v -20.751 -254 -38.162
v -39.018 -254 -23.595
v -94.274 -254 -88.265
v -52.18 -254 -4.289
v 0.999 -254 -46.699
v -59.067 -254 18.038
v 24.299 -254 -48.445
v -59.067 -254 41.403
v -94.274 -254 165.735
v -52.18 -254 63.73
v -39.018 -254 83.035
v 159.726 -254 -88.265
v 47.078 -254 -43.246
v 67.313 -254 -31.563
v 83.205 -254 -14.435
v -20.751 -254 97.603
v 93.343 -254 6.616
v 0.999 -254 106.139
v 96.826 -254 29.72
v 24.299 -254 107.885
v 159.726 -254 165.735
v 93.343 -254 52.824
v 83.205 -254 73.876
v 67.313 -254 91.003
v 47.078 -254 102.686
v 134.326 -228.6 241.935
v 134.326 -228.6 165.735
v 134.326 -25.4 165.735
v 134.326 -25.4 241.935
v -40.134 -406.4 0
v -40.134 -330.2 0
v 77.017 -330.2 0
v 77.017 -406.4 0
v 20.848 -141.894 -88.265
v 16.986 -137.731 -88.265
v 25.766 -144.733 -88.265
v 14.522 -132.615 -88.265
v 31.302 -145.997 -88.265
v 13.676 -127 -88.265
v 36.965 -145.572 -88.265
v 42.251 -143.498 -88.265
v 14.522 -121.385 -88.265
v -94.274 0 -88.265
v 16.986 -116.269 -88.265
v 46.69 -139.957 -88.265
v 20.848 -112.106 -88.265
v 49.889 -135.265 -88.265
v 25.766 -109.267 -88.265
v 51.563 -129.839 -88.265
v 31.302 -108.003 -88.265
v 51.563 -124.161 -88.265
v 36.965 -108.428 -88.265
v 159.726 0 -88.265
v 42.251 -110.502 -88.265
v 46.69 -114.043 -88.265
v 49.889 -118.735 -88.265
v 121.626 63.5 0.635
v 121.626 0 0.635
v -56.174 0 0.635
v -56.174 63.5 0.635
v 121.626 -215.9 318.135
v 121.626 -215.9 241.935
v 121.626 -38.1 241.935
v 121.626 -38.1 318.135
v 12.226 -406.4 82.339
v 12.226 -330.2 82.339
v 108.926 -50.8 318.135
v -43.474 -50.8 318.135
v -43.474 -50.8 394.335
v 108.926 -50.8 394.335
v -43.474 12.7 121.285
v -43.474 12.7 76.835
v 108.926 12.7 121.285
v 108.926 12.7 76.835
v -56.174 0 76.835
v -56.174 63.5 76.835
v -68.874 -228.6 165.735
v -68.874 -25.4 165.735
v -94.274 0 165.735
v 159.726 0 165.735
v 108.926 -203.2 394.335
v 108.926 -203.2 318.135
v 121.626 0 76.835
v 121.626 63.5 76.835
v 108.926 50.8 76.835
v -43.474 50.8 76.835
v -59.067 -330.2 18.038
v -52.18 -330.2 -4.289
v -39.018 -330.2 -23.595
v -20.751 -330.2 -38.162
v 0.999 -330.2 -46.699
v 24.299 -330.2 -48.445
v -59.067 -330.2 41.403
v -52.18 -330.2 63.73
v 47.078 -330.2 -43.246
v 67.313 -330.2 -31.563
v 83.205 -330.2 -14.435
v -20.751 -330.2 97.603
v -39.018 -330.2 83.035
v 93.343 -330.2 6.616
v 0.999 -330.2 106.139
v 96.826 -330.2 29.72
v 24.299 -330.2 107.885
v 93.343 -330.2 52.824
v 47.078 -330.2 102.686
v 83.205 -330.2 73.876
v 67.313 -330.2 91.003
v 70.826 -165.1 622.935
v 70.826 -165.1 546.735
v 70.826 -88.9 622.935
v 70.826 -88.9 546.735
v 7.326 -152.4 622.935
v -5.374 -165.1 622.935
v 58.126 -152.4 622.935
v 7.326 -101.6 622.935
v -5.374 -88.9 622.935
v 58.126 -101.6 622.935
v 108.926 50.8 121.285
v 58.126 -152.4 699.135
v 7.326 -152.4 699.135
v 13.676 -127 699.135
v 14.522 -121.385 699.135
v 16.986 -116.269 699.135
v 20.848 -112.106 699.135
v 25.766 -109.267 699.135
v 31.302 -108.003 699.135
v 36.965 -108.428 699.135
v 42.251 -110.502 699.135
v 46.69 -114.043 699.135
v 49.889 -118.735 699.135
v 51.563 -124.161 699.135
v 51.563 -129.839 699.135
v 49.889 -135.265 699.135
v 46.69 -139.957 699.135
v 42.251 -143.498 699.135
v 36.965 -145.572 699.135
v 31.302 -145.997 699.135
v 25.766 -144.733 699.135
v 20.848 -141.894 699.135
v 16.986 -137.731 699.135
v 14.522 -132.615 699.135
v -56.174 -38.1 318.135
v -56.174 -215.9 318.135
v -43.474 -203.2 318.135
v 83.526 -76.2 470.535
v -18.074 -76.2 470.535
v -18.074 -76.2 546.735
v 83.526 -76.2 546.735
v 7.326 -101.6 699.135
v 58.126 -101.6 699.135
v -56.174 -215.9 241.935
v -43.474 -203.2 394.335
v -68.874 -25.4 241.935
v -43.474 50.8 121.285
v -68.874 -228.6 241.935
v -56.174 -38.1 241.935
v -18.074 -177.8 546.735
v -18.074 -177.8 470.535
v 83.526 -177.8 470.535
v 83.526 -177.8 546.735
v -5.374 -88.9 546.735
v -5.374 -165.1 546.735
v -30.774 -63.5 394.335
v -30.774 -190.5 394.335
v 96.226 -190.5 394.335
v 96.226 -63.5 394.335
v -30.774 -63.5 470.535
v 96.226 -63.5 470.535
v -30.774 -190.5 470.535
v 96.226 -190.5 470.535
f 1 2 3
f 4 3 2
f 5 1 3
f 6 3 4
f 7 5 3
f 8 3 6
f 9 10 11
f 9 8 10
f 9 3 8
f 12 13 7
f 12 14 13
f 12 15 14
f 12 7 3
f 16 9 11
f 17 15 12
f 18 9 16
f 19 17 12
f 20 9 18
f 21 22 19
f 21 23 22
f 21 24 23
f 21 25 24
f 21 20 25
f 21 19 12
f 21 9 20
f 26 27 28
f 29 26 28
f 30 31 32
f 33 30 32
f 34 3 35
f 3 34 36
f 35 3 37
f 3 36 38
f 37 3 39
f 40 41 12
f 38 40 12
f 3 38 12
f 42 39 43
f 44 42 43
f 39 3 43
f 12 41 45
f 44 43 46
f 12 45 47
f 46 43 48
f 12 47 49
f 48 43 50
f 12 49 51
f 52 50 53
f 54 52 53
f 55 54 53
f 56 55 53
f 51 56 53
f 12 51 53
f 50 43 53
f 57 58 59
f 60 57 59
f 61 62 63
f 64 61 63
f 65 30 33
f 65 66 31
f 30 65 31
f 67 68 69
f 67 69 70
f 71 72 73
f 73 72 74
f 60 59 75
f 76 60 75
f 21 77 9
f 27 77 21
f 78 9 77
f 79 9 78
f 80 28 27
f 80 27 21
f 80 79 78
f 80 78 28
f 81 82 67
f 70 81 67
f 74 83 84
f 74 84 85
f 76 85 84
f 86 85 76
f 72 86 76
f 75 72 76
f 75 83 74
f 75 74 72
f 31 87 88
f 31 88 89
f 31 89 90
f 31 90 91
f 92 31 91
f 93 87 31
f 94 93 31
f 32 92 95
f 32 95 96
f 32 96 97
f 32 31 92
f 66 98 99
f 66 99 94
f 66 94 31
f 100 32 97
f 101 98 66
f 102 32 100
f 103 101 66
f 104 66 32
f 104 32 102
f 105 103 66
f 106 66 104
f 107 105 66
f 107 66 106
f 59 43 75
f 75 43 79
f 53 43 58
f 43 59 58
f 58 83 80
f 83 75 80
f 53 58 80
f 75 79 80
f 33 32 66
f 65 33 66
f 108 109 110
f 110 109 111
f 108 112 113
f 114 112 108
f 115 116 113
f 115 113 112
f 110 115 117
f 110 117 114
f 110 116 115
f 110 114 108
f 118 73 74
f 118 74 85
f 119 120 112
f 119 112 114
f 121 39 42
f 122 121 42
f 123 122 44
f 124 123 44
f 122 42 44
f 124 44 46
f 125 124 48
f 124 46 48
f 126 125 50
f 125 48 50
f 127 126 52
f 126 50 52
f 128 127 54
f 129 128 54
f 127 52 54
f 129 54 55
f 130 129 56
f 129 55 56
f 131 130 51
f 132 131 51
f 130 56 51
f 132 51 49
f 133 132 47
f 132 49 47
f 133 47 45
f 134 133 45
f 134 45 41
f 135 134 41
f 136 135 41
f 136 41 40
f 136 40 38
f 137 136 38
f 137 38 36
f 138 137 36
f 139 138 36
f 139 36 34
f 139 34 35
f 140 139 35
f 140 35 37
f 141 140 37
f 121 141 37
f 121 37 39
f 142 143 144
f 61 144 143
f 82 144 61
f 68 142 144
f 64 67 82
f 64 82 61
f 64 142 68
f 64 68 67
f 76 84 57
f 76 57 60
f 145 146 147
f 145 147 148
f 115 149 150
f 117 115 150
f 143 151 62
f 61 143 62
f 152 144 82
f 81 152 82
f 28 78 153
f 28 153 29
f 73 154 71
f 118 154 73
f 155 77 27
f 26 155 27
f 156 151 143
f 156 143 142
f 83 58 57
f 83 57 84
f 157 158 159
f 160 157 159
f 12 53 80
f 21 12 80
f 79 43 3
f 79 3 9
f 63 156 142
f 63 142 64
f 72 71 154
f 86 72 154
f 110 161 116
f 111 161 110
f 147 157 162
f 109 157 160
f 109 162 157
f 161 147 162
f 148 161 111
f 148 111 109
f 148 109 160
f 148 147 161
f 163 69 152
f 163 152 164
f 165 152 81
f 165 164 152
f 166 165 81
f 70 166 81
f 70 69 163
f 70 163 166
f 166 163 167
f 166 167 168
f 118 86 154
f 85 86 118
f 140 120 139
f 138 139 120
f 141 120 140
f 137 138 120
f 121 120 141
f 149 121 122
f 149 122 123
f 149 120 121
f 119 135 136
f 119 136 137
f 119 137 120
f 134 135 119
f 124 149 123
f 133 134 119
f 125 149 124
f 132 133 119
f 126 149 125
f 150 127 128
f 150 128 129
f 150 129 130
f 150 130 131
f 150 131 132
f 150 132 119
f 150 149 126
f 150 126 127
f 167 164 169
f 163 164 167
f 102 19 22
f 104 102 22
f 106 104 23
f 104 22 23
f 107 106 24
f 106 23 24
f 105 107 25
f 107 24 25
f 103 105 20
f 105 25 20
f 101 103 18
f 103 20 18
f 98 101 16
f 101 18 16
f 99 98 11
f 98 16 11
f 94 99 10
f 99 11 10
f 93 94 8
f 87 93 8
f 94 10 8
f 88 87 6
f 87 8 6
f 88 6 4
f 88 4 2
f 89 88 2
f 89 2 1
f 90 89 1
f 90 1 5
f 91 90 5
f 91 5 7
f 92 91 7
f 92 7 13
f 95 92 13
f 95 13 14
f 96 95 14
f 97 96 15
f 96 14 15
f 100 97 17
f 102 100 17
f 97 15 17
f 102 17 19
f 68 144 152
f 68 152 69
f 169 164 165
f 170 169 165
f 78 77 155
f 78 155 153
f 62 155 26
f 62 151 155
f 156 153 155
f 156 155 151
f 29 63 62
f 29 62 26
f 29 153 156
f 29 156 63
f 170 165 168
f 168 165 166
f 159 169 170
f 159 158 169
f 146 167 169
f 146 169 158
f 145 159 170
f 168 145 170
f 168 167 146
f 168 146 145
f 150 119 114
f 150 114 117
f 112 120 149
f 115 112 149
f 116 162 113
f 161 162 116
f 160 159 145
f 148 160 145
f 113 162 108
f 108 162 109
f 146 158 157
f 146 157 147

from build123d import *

# Parameters (mm, degrees)
F0_W      = 254
F0_H      = 254
F1_DEPTH  = 254
F3_W      = 203.2
F3_H      = 203.2
F4_DEPTH  = 76.2
F5_W      = 177.8
F5_H      = 177.8
F6_DEPTH  = 76.2
F7_W      = 152.4
F7_H      = 152.4
F8_DEPTH  = 76.2
F9_W      = 127
F9_H      = 127
F10_DEPTH = 76.2
F11_W     = 101.6
F11_H     = 101.6
F12_DEPTH = 76.2
F13_W     = 76.2
F13_H     = 76.2
F14_DEPTH = 76.2
F15_W     = 50.8
F15_H     = 50.8
F16_DEPTH = 76.2
F18_D     = 38.1
F2_R      = 78.384175
F19_DEPTH = 76.2
F21_DEPTH = 76.2
F22_W     = 177.8
F22_H     = 76.2
F23_DEPTH = 63.5
F25_W     = 152.4
F25_H     = 38.1
F26_DEPTH = 44.45


with BuildPart() as f1:
    # F0 (on Front) → F1 (new body)
    with BuildSketch(Plane.XZ):
        with Locations((32.72583, 38.734609)):
            Rectangle(F0_W, F0_H)
    extrude(amount=F1_DEPTH)

    # F3 (on face) → F4 (join)
    with BuildSketch(Plane.XY.offset(165.734609)):
        with Locations((32.72583, -127)):
            Rectangle(F3_W, F3_H)
    extrude(amount=F4_DEPTH)

    # F5 (on face) → F6 (join)
    with BuildSketch(Plane.XY.offset(241.934609)):
        with Locations((32.72583, -127)):
            Rectangle(F5_W, F5_H)
    extrude(amount=F6_DEPTH)

    # F7 (on face) → F8 (join)
    with BuildSketch(Plane.XY.offset(318.134609)):
        with Locations((32.72583, -127)):
            Rectangle(F7_W, F7_H)
    extrude(amount=F8_DEPTH)

    # F9 (on face) → F10 (join)
    with BuildSketch(Plane.XY.offset(394.334609)):
        with Locations((32.72583, -127)):
            Rectangle(F9_W, F9_H)
    extrude(amount=F10_DEPTH)

    # F11 (on face) → F12 (join)
    with BuildSketch(Plane.XY.offset(470.534609)):
        with Locations((32.72583, -127)):
            Rectangle(F11_W, F11_H)
    extrude(amount=F12_DEPTH)

    # F13 (on face) → F14 (join)
    with BuildSketch(Plane.XY.offset(546.734609)):
        with Locations((32.72583, -127)):
            Rectangle(F13_W, F13_H)
    extrude(amount=F14_DEPTH)

    # F15 (on face) → F16 (join)
    with BuildSketch(Plane.XY.offset(622.934609)):
        with Locations((32.725834, -127)):
            Rectangle(F15_W, F15_H)
    extrude(amount=F16_DEPTH)

    # F18 (through all)
    with Locations(Plane.XY.offset(699.134609)):
        with Locations((32.725834, -127)):
            Hole(F18_D / 2)

    # F2 (on face) → F19 (join)
    with BuildSketch(Plane.XZ.offset(254)):
        with Locations((18.441331, 29.720267)):
            Circle(F2_R)
    extrude(amount=F19_DEPTH)

    # F20 (on face) → F21 (join)
    with BuildSketch(Plane.XZ.offset(330.2)):
        Polygon((77.017064, 0), (12.2257, 82.338598), (-40.134403, 0), align=None)
    extrude(amount=F21_DEPTH)

    # F22 (on face) → F23 (join)
    with BuildSketch(Plane(origin=(0, 0, 0), x_dir=(-1, 0, 0), z_dir=(0, 1, 0))):
        with Locations((-32.72583, 38.734609)):
            Rectangle(F22_W, F22_H)
    extrude(amount=F23_DEPTH)

    # F25 (on face) → F26 (join)
    with BuildSketch(Plane.XY.offset(76.834609)):
        with Locations((32.72583, 31.75)):
            Rectangle(F25_W, F25_H)
    extrude(amount=F26_DEPTH)


solid = f1.part
